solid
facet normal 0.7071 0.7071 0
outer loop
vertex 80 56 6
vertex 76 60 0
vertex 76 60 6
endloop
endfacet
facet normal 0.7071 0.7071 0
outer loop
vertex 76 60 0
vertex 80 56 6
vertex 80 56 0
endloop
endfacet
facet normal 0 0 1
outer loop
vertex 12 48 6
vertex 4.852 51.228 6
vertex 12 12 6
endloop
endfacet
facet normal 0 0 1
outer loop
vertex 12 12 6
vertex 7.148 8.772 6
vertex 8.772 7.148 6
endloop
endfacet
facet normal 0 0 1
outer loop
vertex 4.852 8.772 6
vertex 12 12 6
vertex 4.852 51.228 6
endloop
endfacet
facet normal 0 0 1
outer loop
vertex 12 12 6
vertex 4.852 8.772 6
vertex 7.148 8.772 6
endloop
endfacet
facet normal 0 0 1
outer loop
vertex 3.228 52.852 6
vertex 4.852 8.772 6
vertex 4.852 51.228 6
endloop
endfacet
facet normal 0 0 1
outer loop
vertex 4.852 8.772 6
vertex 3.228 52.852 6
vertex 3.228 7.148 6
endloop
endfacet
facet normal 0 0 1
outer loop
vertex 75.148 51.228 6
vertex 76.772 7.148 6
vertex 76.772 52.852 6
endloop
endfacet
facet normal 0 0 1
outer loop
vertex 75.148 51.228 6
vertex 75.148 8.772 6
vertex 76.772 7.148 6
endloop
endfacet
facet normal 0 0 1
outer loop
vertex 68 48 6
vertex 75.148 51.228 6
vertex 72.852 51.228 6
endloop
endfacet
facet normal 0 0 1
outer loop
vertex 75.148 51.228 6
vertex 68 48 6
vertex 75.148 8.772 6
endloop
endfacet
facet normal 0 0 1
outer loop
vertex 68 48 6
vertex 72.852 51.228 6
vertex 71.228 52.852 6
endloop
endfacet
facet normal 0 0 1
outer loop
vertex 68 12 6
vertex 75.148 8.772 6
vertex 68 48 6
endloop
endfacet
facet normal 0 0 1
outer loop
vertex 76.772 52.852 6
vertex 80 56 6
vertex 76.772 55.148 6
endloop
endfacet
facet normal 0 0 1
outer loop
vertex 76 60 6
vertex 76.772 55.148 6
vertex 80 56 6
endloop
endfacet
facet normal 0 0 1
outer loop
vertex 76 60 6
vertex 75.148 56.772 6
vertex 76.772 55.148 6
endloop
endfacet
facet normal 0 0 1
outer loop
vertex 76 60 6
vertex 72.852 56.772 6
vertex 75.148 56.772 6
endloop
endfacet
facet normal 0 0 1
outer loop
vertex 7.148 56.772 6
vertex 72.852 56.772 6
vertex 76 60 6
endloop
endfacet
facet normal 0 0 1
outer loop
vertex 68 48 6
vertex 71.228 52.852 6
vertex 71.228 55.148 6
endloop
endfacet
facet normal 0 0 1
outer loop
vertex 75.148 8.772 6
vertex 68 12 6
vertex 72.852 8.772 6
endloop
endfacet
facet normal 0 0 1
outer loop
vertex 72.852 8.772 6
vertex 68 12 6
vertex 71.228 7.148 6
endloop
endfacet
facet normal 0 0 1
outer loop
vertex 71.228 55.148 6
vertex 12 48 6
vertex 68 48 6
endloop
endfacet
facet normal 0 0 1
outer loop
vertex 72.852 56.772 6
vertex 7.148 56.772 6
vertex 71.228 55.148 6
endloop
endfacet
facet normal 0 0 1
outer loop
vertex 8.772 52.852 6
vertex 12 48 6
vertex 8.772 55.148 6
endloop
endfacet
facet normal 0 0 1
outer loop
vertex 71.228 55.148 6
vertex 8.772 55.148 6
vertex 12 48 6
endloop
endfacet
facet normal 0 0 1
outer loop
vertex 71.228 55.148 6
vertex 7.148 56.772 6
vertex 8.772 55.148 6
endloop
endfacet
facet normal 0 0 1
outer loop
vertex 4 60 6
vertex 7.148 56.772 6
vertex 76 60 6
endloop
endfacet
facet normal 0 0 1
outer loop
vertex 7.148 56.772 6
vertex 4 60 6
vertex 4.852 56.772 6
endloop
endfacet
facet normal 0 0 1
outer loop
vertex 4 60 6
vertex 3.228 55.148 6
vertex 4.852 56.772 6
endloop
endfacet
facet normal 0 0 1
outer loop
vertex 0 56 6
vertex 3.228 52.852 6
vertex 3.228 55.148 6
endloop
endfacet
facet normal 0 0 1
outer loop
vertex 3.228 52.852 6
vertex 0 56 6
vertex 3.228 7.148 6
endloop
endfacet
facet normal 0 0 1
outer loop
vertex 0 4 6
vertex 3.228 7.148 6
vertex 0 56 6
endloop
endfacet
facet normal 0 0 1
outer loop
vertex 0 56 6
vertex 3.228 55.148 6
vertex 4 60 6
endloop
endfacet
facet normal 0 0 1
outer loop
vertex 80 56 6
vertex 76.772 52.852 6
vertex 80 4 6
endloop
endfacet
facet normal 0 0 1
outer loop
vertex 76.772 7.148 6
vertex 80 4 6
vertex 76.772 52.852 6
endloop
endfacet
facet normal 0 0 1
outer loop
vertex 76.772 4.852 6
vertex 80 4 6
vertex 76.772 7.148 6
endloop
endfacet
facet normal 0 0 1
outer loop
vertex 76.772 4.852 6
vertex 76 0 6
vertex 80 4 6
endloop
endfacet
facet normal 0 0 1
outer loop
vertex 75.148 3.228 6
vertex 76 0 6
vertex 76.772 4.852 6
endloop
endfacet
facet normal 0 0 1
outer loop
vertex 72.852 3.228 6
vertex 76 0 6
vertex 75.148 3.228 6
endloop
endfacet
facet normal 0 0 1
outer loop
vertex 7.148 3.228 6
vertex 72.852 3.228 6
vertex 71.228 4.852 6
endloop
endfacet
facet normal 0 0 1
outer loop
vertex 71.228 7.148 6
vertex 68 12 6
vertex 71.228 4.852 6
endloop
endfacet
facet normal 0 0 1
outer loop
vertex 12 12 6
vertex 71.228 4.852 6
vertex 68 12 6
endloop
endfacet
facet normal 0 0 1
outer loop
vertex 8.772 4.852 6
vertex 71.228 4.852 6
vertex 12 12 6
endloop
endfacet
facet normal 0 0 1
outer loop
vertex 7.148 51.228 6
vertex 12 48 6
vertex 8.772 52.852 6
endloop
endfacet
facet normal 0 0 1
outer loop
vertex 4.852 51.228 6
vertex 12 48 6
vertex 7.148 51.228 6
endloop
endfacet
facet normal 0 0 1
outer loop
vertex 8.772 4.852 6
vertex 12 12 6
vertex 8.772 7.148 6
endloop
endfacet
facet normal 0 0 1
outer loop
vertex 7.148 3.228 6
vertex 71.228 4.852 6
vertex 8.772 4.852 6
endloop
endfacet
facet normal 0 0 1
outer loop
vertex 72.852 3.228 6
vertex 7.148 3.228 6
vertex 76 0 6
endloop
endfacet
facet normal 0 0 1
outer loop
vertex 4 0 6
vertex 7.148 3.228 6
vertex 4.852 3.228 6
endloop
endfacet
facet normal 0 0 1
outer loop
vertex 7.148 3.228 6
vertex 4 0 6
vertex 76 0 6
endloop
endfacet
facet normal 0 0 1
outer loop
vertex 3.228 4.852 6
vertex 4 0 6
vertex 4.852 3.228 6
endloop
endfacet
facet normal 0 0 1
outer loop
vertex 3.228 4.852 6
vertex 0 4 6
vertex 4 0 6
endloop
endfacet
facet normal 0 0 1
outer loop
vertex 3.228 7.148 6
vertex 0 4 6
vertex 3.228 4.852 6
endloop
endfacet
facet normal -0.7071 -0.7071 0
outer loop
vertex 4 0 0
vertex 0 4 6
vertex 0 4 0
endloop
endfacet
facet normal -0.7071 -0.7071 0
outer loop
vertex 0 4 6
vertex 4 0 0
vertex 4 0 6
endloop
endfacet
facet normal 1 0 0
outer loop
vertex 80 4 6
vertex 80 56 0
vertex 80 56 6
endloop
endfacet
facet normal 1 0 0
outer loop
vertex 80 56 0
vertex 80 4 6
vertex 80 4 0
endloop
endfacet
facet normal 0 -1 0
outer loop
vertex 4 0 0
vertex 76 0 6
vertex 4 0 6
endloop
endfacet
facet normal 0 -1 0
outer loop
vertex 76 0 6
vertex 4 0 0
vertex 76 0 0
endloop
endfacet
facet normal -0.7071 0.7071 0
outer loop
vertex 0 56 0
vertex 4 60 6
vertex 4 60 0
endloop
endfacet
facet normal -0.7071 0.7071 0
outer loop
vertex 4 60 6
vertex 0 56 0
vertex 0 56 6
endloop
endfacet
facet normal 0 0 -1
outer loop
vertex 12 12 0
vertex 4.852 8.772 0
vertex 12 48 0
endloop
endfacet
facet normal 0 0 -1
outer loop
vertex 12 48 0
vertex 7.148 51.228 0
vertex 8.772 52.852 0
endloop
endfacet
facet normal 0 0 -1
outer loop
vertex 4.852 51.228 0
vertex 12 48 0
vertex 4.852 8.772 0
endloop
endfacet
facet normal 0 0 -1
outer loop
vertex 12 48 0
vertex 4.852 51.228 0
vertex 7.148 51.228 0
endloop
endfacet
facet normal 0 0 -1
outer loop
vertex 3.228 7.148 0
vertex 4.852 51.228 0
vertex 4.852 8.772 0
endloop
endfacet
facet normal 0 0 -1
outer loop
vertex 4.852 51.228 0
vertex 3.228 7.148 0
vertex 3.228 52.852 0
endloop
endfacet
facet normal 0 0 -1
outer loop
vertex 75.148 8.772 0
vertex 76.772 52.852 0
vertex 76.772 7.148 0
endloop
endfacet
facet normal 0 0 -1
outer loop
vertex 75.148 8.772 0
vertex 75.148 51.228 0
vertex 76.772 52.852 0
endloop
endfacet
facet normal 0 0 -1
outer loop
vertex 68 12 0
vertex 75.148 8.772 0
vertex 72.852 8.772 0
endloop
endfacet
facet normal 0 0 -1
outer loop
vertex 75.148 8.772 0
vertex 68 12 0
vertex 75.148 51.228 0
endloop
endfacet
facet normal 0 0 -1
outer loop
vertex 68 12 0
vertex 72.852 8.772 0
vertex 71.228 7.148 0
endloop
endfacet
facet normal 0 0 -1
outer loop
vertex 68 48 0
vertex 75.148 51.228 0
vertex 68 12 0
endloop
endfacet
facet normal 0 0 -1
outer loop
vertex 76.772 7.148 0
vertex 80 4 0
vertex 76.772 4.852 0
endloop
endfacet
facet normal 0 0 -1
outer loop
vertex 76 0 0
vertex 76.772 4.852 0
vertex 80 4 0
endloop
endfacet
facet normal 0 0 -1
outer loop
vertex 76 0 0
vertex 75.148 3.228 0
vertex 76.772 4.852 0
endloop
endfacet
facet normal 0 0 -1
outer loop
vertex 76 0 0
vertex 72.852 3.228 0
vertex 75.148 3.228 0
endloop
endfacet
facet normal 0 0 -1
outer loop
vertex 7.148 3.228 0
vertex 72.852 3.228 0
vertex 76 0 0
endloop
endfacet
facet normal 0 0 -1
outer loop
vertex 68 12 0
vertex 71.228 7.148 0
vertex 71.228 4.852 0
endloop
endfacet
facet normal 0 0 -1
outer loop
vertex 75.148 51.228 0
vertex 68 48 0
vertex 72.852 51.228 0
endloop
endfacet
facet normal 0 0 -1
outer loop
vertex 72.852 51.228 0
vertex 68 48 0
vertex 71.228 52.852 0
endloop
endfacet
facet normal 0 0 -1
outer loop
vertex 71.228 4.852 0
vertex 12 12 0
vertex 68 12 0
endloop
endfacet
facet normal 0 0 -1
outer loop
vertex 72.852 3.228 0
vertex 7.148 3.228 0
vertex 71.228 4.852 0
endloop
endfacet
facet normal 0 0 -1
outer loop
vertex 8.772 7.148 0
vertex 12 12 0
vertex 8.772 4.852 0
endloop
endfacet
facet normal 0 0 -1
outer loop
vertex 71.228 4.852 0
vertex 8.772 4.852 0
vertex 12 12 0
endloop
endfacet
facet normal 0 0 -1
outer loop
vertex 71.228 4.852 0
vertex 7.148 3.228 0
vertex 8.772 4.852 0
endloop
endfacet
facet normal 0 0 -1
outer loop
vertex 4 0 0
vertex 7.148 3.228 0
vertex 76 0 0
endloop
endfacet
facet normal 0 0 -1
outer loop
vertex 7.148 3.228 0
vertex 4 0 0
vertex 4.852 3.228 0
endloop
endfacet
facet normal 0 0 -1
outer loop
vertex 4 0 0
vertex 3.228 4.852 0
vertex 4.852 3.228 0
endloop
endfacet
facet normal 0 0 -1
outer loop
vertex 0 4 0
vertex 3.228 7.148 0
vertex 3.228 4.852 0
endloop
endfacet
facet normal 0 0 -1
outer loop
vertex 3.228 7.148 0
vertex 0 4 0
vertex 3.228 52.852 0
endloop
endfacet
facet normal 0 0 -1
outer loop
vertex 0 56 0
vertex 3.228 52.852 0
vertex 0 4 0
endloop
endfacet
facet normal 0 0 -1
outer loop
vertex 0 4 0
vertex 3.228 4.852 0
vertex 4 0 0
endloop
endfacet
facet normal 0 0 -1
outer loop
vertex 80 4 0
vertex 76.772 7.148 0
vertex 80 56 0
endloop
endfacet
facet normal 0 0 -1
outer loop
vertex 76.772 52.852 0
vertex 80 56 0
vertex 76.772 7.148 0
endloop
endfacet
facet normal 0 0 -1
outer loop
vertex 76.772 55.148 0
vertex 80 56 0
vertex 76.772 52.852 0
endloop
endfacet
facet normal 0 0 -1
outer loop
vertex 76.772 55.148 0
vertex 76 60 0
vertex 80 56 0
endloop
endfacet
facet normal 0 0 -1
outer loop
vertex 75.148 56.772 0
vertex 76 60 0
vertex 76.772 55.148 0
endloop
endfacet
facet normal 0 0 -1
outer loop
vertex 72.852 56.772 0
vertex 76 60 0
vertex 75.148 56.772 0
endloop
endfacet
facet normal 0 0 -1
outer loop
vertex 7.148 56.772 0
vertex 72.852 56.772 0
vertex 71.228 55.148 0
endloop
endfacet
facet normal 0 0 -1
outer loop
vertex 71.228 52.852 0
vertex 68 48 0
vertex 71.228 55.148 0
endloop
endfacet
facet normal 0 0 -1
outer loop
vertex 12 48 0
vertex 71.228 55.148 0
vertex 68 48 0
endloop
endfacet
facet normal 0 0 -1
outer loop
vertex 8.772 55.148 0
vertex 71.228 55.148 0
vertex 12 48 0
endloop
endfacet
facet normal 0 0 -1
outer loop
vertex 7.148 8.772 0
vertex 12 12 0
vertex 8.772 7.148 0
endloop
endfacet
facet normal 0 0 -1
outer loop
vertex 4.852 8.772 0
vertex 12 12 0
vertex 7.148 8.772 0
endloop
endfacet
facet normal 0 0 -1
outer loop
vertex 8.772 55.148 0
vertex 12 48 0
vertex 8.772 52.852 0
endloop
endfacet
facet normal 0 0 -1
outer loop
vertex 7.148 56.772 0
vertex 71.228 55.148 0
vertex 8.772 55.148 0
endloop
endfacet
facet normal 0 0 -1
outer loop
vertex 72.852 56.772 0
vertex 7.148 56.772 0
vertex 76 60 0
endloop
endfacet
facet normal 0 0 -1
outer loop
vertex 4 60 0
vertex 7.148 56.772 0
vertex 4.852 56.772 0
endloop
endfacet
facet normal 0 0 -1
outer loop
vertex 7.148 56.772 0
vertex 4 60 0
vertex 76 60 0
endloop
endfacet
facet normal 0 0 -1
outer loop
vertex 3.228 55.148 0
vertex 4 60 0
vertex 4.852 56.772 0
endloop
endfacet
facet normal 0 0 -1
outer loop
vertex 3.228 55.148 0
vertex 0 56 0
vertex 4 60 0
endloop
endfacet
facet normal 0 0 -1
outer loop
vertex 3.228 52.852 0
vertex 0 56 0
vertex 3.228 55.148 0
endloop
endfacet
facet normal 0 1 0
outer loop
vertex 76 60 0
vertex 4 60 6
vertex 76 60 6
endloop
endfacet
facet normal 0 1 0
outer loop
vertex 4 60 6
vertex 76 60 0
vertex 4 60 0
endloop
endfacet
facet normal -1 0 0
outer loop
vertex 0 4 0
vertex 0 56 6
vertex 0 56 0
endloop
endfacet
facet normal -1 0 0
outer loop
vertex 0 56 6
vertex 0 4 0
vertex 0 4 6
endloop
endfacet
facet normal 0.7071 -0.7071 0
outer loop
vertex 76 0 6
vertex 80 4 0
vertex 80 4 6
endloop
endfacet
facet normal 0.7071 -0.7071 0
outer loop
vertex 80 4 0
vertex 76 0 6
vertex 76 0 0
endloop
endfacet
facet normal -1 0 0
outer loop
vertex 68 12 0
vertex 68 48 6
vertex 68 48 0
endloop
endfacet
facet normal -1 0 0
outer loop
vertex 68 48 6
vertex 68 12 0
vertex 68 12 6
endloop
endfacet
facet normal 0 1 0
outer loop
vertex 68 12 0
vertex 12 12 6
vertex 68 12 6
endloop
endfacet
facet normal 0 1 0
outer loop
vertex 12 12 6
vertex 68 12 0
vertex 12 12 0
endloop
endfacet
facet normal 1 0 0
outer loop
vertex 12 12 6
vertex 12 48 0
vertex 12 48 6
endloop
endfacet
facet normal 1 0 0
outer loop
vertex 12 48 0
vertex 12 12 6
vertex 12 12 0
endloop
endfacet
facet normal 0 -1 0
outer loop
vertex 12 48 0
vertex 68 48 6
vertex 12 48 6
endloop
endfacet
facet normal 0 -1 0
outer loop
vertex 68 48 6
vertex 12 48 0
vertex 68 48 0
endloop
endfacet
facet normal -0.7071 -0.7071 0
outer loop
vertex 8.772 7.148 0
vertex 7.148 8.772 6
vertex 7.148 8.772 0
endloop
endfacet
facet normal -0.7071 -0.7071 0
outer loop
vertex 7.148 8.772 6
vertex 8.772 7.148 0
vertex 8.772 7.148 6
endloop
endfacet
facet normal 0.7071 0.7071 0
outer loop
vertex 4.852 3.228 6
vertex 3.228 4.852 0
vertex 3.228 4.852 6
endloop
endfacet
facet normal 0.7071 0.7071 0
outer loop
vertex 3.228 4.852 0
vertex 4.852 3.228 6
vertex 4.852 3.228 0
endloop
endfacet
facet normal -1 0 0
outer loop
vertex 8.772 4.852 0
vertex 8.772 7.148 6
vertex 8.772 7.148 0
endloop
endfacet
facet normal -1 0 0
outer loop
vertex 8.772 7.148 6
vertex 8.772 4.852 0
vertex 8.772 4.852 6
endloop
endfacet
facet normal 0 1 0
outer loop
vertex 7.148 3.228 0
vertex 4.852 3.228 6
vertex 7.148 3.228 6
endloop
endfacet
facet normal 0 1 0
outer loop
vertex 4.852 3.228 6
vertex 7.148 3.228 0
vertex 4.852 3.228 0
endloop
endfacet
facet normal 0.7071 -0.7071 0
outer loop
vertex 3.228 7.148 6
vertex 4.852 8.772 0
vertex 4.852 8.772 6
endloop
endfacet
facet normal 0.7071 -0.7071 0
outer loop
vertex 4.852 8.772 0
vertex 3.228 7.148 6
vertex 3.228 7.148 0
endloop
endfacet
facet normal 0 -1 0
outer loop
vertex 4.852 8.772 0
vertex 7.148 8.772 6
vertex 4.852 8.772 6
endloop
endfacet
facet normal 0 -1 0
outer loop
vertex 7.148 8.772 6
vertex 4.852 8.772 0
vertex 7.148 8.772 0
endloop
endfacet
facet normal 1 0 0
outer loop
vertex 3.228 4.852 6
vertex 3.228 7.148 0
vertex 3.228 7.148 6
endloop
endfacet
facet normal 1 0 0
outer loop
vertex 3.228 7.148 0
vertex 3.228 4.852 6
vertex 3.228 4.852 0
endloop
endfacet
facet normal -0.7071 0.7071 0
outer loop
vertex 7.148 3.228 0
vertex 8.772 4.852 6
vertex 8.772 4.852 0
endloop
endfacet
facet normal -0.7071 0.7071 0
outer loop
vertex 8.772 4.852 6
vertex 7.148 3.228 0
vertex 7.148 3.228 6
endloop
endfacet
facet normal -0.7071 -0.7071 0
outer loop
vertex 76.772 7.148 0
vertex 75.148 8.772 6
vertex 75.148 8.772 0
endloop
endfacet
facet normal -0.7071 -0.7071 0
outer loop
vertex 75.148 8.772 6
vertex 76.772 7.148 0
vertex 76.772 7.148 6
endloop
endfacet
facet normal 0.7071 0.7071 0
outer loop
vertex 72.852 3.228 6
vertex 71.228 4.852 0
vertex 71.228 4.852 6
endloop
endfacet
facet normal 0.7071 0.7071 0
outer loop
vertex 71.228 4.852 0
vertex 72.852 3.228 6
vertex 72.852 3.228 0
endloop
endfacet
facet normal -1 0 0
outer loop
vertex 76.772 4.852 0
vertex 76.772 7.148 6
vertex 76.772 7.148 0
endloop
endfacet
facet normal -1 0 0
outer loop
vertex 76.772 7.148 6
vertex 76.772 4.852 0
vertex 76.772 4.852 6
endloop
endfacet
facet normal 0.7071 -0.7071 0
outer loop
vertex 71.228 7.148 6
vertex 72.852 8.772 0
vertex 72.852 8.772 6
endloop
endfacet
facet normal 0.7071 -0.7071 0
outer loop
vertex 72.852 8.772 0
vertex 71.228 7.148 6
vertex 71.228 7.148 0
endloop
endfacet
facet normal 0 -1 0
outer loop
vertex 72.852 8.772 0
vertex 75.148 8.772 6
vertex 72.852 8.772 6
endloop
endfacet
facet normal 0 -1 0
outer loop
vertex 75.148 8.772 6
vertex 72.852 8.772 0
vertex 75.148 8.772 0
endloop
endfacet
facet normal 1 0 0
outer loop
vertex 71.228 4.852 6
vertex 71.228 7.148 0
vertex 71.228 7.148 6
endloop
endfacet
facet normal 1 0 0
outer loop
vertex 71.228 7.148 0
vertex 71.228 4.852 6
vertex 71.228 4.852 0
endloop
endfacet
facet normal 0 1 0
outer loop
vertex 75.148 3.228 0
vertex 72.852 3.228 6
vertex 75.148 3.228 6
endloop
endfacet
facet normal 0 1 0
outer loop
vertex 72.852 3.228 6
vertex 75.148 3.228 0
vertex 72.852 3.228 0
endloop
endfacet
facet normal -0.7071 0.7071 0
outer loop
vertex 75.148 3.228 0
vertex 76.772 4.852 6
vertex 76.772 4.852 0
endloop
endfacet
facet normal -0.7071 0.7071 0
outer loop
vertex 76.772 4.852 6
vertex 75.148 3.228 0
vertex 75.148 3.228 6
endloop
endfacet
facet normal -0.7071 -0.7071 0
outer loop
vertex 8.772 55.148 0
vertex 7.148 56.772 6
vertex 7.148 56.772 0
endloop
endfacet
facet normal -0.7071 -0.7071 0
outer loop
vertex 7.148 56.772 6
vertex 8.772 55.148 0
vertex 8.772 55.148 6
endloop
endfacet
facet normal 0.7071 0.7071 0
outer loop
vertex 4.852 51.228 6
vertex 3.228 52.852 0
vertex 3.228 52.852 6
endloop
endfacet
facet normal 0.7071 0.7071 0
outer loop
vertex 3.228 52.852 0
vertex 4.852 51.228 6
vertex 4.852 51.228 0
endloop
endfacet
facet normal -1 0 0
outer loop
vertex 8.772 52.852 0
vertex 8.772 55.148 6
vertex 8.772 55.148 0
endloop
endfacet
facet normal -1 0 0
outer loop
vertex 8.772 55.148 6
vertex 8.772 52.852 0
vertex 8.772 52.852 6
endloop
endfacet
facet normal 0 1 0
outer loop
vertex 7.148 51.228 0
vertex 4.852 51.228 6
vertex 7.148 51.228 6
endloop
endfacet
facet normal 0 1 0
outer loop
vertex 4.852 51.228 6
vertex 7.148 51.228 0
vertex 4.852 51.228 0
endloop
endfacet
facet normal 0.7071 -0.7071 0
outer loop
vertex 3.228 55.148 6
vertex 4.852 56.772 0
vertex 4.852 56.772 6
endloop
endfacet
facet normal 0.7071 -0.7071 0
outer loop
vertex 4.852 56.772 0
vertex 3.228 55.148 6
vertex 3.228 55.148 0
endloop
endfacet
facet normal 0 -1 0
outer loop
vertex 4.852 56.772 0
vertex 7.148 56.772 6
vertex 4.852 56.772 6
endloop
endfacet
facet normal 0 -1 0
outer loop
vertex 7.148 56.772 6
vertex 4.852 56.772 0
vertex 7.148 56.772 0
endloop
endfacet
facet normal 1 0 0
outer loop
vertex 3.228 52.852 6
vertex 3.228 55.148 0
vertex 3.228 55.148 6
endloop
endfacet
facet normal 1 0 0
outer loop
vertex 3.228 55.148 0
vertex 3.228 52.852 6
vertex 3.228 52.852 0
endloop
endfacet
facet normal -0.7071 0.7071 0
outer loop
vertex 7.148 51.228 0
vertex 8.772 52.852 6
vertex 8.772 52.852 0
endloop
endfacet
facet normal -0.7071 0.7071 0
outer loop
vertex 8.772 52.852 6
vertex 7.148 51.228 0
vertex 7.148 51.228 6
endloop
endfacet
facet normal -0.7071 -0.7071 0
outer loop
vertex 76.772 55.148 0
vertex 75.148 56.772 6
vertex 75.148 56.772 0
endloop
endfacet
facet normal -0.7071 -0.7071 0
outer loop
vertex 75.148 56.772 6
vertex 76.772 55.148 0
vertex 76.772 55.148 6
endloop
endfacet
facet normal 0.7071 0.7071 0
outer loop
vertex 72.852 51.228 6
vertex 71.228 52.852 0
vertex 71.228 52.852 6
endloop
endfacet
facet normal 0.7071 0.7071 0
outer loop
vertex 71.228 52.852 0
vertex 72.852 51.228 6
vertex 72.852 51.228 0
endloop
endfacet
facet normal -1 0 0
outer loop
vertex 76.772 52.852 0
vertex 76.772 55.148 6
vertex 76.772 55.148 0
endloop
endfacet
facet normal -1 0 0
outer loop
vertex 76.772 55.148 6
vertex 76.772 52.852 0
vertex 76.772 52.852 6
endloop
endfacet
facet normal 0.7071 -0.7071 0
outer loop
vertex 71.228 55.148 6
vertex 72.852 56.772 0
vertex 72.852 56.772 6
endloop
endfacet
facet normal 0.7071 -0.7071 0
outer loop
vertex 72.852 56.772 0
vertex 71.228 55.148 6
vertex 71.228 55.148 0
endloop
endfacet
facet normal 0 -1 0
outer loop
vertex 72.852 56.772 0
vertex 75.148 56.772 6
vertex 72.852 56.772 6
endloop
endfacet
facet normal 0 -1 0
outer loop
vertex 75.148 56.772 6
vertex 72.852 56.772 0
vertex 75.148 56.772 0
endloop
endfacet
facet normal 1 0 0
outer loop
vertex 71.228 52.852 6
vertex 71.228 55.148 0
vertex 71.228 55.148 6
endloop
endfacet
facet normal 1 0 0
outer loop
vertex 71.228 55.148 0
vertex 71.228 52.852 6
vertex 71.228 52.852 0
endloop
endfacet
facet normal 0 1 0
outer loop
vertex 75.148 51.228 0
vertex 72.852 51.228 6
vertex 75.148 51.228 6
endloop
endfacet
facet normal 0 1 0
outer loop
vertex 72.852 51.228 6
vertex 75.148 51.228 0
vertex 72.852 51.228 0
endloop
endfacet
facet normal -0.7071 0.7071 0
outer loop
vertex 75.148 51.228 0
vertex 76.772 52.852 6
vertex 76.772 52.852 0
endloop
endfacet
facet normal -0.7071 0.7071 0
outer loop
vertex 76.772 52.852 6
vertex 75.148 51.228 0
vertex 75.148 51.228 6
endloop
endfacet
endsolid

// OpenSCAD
$fn = 32;

// ----------------------------------------------------------------------
// Frame plate: 80 x 60 frame, 12 mm rails
// ----------------------------------------------------------------------

// --- parameters (mm) ---
plate_l = 80;             // plate length, X
plate_w = 60;             // plate width, Y
plate_t = 6;              // plate thickness, Z (extrusion height)
corner_c = 4;             // corner chamfer
frame_bar = 12;           // frame rail width
bolt_r = 3;               // corner bolt window radius
bolt_inset = 6;           // bolt centre inset from the edges

win_l = plate_l - 2 * frame_bar;  // window length
win_w = plate_w - 2 * frame_bar;  // window width
bolt_d = 2 * bolt_r;  // corner hole diameter

profile = [[4, 0], [76, 0], [80, 4], [80, 56], [76, 60], [4, 60], [0, 56], [0, 4]];  // primary outline, 8 points, counter clockwise
void_1 = [[12, 12], [68, 12], [68, 48], [12, 48]];  // the window, 4 points
void_2 = [[8.772, 7.148], [7.148, 8.772], [4.852, 8.772], [3.228, 7.148], [3.228, 4.852], [4.852, 3.228], [7.148, 3.228], [8.772, 4.852]];  // corner bolt window, 8 points
void_3 = [[76.772, 7.148], [75.148, 8.772], [72.852, 8.772], [71.228, 7.148], [71.228, 4.852], [72.852, 3.228], [75.148, 3.228], [76.772, 4.852]];  // corner bolt window, 8 points
void_4 = [[8.772, 55.148], [7.148, 56.772], [4.852, 56.772], [3.228, 55.148], [3.228, 52.852], [4.852, 51.228], [7.148, 51.228], [8.772, 52.852]];  // corner bolt window, 8 points
void_5 = [[76.772, 55.148], [75.148, 56.772], [72.852, 56.772], [71.228, 55.148], [71.228, 52.852], [72.852, 51.228], [75.148, 51.228], [76.772, 52.852]];  // corner bolt window, 8 points

// --- the one profile operation ---
difference() {
  linear_extrude(height = plate_t) polygon(points = profile);
  translate([0, 0, -1])
    linear_extrude(height = plate_t + 2) polygon(points = void_1);
  translate([0, 0, -1])
    linear_extrude(height = plate_t + 2) polygon(points = void_2);
  translate([0, 0, -1])
    linear_extrude(height = plate_t + 2) polygon(points = void_3);
  translate([0, 0, -1])
    linear_extrude(height = plate_t + 2) polygon(points = void_4);
  translate([0, 0, -1])
    linear_extrude(height = plate_t + 2) polygon(points = void_5);
}
